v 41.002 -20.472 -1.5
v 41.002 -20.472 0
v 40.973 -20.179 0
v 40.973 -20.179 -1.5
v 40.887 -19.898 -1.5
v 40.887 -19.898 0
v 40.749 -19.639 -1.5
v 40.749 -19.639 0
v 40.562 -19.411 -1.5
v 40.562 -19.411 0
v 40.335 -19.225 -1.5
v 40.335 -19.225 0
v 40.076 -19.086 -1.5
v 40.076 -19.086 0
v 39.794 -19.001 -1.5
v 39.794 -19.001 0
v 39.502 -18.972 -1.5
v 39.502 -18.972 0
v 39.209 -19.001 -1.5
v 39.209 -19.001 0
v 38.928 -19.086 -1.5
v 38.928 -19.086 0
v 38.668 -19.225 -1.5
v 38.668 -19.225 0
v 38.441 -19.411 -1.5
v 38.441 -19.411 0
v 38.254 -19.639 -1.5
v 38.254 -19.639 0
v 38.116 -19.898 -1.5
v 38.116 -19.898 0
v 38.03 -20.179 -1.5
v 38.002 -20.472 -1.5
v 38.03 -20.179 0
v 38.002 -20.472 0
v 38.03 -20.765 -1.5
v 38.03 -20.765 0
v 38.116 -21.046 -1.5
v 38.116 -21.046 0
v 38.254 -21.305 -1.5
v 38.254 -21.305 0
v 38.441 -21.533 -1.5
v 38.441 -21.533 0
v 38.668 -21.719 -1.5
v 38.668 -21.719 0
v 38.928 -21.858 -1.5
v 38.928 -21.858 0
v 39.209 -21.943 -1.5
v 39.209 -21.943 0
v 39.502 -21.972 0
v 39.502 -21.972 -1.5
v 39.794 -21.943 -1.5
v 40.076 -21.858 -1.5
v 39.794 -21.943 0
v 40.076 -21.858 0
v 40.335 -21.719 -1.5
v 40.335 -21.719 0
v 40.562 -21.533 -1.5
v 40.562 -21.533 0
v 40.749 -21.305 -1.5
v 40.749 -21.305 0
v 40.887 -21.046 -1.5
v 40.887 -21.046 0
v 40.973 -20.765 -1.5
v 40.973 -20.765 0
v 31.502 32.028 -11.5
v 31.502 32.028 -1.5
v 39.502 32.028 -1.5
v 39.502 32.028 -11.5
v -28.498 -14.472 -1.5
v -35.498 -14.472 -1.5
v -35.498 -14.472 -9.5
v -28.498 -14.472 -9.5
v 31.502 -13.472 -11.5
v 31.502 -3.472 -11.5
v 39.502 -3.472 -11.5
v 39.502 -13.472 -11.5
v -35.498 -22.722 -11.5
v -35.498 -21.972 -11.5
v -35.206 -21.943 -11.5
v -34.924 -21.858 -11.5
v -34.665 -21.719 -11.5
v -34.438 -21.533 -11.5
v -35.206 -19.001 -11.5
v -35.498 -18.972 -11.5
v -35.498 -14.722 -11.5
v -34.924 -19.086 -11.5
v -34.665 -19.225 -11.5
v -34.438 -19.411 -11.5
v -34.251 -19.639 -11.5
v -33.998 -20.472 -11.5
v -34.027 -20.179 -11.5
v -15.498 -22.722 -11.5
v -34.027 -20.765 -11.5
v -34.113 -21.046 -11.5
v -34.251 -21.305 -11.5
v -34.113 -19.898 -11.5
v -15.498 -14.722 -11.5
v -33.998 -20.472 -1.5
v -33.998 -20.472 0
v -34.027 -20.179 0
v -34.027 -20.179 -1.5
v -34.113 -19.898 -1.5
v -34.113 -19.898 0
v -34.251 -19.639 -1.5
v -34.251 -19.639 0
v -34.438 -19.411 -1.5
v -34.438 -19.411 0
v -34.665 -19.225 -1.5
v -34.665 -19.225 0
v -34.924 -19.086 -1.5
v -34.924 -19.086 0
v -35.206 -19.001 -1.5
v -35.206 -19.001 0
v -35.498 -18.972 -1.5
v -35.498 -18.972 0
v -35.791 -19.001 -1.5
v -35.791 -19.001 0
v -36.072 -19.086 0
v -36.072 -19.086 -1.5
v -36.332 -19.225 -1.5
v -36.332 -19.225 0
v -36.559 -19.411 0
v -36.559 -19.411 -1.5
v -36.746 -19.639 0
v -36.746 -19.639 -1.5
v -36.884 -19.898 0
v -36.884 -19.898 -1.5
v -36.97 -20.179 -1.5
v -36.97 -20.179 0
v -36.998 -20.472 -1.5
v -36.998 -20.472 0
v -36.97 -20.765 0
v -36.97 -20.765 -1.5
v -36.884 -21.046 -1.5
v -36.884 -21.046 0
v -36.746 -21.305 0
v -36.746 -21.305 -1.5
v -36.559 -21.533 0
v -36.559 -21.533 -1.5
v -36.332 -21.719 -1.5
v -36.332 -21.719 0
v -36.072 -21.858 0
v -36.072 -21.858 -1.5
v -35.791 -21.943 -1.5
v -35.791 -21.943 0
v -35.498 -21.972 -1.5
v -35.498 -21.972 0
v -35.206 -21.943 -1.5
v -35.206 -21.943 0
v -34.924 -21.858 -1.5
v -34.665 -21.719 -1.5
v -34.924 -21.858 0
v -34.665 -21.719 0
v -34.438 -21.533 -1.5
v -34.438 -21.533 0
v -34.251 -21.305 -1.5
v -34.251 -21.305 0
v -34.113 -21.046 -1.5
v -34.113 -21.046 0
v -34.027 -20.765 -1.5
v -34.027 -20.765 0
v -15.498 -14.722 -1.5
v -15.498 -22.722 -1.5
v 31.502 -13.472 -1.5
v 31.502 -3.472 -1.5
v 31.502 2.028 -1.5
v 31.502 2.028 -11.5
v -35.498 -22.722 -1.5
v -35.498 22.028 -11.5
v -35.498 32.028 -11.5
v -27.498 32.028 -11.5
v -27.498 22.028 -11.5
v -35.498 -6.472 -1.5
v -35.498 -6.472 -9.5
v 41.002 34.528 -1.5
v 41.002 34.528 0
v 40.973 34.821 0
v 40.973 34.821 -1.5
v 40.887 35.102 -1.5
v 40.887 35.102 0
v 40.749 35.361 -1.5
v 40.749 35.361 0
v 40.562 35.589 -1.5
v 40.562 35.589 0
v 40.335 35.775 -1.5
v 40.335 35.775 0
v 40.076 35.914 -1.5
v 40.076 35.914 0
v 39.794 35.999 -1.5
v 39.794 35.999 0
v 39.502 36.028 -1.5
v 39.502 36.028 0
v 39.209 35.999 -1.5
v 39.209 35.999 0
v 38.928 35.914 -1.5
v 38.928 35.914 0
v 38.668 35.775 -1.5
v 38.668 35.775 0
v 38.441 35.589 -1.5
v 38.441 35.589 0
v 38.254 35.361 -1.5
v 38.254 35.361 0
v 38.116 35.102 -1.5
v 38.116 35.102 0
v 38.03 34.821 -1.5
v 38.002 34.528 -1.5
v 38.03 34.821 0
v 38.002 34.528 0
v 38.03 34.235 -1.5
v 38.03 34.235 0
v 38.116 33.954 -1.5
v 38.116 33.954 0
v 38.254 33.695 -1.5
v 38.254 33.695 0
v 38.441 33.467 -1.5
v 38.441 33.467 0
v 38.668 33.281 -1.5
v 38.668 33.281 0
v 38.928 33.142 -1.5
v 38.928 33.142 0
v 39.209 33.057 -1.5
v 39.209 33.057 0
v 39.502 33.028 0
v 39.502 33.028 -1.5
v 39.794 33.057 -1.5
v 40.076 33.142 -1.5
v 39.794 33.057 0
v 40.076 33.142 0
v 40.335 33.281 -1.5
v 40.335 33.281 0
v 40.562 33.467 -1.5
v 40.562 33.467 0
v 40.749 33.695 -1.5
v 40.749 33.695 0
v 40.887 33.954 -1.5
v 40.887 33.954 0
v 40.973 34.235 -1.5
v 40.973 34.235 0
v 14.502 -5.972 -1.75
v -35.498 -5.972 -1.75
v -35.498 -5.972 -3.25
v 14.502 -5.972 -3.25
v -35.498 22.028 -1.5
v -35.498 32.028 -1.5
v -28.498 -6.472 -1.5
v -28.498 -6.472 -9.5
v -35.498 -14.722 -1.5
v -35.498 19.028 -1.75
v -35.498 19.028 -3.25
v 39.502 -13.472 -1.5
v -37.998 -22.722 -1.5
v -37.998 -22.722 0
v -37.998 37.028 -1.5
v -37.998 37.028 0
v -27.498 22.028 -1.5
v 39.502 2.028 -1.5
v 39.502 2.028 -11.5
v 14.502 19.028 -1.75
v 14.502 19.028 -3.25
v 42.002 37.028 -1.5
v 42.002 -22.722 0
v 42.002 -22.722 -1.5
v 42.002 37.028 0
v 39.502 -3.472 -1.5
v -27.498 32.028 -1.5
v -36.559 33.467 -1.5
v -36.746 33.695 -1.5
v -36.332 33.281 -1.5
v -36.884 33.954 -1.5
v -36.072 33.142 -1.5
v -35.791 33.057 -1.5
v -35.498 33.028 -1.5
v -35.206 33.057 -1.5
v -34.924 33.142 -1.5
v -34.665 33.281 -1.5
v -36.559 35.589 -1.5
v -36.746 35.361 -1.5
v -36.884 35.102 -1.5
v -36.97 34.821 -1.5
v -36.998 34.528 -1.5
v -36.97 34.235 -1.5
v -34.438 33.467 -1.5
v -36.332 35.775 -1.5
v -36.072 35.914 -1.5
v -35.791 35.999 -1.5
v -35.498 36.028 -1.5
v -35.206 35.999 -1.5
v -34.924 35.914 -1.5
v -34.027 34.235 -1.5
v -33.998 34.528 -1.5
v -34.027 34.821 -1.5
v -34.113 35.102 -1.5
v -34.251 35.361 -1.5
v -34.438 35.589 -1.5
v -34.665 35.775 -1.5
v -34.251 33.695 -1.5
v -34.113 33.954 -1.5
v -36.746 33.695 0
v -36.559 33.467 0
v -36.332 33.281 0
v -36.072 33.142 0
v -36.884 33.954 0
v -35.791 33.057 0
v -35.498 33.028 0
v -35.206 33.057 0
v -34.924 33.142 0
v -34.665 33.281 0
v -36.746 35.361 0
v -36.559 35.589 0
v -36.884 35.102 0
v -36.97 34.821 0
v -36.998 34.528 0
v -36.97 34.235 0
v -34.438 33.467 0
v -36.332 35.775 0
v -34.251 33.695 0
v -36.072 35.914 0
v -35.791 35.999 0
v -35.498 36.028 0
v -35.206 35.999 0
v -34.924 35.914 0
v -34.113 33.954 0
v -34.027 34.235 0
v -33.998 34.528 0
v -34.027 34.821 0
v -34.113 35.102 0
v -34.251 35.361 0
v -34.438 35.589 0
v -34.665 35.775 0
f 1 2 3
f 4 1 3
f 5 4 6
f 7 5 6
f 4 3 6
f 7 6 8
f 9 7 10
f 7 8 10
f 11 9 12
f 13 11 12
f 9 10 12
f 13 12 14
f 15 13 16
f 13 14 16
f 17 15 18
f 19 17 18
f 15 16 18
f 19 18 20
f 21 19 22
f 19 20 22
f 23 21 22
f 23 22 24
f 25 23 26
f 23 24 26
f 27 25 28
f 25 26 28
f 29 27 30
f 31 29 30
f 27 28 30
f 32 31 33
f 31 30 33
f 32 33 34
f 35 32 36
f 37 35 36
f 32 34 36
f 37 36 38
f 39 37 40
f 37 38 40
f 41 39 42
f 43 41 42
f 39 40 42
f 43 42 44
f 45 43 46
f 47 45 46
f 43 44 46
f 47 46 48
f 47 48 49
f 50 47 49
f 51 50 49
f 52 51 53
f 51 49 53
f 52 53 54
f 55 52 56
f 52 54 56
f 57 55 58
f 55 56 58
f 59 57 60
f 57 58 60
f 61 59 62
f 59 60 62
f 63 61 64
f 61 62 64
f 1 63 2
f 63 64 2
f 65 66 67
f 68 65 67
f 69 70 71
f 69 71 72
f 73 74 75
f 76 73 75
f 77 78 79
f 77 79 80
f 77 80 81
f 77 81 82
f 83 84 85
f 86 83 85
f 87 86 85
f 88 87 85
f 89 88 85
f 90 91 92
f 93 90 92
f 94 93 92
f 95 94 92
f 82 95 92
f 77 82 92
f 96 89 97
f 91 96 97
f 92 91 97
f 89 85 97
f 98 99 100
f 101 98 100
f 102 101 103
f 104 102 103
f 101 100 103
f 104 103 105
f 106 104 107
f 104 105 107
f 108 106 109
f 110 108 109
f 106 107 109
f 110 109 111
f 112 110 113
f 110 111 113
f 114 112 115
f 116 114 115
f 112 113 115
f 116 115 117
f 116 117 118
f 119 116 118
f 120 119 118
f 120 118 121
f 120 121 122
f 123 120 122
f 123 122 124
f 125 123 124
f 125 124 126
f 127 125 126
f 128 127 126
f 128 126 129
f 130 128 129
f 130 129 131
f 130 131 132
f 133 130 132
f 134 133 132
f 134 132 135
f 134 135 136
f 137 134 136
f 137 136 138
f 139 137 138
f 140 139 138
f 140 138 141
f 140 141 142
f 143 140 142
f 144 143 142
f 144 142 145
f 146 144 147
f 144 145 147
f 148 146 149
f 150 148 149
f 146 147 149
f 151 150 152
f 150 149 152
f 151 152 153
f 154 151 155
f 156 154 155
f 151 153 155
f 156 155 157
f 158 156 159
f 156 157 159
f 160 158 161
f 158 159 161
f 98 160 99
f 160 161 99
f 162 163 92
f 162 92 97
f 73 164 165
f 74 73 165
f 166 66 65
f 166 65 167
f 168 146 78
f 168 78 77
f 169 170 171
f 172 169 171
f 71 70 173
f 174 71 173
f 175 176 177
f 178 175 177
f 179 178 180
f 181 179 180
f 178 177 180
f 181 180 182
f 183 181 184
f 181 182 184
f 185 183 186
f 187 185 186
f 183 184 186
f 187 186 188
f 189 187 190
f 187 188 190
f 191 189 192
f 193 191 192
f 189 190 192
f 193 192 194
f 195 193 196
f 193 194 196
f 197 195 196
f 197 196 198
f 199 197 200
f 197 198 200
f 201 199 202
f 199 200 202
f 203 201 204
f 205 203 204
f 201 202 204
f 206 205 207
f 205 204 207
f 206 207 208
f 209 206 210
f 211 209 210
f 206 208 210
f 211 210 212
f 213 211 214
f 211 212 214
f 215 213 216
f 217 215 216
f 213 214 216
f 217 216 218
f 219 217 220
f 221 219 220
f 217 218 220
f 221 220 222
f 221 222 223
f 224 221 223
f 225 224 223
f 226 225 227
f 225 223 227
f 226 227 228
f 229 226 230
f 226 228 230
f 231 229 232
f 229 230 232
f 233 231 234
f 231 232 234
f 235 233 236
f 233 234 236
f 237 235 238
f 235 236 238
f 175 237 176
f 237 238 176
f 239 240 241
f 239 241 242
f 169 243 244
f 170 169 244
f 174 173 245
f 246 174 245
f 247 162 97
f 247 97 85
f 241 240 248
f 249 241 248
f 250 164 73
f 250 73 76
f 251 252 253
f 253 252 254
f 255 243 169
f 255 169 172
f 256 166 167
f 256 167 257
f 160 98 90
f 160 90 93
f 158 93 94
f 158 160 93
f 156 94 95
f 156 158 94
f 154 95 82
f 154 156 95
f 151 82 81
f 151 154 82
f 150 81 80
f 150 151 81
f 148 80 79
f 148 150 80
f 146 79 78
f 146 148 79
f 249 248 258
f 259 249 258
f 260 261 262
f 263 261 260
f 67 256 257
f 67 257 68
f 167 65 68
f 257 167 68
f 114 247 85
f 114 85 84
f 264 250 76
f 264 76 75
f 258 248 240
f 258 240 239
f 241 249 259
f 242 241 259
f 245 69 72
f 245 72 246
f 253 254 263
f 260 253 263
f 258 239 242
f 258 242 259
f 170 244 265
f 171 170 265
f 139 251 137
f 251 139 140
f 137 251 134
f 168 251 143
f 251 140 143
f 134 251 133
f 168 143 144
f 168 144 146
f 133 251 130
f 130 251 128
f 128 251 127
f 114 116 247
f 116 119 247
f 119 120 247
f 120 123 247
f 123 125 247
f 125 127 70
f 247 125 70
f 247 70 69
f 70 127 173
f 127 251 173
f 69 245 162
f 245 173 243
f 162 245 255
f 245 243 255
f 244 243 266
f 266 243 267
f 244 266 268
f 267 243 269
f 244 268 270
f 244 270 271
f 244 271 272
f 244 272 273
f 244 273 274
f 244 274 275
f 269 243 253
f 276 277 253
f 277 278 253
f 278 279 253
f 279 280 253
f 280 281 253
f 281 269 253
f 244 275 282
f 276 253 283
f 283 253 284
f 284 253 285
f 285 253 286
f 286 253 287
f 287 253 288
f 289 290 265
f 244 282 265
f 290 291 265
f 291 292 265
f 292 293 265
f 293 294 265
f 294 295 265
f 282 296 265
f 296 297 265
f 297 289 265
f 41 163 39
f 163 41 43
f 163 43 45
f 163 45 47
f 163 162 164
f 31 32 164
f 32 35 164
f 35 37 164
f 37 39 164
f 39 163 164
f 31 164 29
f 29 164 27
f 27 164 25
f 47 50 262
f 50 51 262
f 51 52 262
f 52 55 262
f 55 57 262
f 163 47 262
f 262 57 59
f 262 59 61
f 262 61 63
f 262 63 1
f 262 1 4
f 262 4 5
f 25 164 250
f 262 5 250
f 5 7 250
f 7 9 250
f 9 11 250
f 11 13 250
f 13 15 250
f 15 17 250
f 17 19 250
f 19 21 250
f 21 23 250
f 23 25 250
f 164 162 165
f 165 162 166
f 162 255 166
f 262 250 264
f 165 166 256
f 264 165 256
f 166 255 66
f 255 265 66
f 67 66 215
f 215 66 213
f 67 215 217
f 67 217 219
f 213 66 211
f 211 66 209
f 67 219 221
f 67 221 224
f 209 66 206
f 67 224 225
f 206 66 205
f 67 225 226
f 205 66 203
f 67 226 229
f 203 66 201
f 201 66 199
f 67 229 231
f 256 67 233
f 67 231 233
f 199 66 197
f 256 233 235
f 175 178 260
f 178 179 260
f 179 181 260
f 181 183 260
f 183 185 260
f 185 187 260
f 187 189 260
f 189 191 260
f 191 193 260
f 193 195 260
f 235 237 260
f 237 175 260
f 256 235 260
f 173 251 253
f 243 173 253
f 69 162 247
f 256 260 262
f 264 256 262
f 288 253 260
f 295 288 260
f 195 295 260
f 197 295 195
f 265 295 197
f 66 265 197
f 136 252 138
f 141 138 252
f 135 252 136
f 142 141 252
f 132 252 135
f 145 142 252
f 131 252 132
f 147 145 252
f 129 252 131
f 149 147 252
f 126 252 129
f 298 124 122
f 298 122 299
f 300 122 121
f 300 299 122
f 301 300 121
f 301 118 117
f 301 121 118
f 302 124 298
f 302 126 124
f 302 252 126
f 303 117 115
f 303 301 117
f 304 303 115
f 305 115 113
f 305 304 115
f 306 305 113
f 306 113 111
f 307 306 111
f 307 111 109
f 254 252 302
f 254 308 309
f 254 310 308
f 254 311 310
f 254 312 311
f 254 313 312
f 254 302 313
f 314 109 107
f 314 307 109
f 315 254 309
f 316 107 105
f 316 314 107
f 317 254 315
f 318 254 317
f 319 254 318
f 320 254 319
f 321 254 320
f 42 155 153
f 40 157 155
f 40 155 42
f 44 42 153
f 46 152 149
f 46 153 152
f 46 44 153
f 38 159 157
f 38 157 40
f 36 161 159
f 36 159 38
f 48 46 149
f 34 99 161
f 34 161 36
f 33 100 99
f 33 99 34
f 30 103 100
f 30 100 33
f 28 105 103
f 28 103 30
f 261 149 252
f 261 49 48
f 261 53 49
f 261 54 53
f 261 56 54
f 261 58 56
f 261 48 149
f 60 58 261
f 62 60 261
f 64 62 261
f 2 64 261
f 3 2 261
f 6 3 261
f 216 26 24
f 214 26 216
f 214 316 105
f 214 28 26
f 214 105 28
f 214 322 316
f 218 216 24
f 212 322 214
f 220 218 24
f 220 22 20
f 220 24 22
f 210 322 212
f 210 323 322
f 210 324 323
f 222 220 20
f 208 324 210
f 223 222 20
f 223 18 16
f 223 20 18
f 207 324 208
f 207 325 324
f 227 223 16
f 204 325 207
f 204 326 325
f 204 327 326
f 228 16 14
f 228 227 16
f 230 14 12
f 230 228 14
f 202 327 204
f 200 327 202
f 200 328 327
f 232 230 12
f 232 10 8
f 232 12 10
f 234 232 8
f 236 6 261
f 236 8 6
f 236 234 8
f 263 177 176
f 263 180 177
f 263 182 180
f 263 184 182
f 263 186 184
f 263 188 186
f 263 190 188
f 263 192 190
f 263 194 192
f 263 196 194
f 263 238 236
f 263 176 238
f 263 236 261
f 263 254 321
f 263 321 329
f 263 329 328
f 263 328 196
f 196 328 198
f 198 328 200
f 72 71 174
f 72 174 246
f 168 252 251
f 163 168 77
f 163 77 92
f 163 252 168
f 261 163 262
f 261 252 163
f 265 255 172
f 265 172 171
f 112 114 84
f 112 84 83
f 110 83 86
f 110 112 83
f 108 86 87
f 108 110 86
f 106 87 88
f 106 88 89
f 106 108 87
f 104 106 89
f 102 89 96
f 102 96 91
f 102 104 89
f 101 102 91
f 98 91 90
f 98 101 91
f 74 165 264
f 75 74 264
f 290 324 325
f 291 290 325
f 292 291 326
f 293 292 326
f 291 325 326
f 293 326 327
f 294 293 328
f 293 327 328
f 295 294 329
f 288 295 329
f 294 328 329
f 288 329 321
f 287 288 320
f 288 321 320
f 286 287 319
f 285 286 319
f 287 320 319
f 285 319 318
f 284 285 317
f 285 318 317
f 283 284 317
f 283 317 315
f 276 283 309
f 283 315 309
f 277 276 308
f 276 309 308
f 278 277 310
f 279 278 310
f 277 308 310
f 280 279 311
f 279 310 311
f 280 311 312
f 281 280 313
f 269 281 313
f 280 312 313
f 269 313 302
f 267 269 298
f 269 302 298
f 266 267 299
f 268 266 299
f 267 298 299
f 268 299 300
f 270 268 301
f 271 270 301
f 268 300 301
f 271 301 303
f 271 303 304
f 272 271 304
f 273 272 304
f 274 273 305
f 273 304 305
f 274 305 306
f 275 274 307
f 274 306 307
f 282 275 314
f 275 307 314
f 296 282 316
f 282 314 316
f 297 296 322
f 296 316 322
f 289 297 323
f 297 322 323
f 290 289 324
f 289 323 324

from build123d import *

# Parameters (mm, degrees)
SKETCH1_W           = 80
SKETCH1_H           = 59.75
SKETCH1_R           = 1.5
BOSS_EXTRUDE1_DEPTH = 1.5
BOSS_EXTRUDE2_START = -1.75
SKETCH1_8_W         = 50
SKETCH1_8_H         = 25
BOSS_EXTRUDE2_DEPTH = 1.5
BOSS_EXTRUDE3_START = -1.5
SKETCH1_9_W         = 8
SKETCH1_9_H         = 10
SKETCH1_9_H_2       = 13
SKETCH1_9_H_3       = 17
BOSS_EXTRUDE3_DEPTH = 10
BOSS_EXTRUDE4_START = -1.5
SKETCH1_10_W        = 7
SKETCH1_10_H        = 8
BOSS_EXTRUDE4_DEPTH = 8


with BuildPart() as part:
    # Sketch1 → Boss-Extrude1 (new body)
    with BuildSketch(Plane.XY):
        with Locations((2.001671, 7.153)):
            Rectangle(SKETCH1_W, SKETCH1_H)
        with Locations((-35.498329, -20.472)):
            Circle(SKETCH1_R, mode=Mode.SUBTRACT)
        with Locations((39.501671, -20.472)):
            Circle(SKETCH1_R, mode=Mode.SUBTRACT)
        with Locations((-35.498329, 34.528)):
            Circle(SKETCH1_R, mode=Mode.SUBTRACT)
        with Locations((39.501671, 34.528)):
            Circle(SKETCH1_R, mode=Mode.SUBTRACT)
    extrude(amount=-BOSS_EXTRUDE1_DEPTH)

    # Sketch1<9> → Boss-Extrude3 (add)
    with BuildSketch(Plane.XY.offset(BOSS_EXTRUDE3_START)):
        with Locations((-31.498329, 27.028)):
            Rectangle(SKETCH1_9_W, SKETCH1_9_H)
        with Locations((35.501671, 25.528)):
            Rectangle(SKETCH1_9_W, SKETCH1_9_H_2)
        with Locations((35.501671, 10.528)):
            Rectangle(SKETCH1_9_W, SKETCH1_9_H_3)
        with Locations((35.501671, -8.472)):
            Rectangle(SKETCH1_9_W, SKETCH1_9_H)
        with BuildLine():
            Line((-15.498329, -14.722), (-35.498329, -14.722))
            Line((-35.498329, -14.722), (-35.498329, -18.972))
            ThreePointArc((-35.498329, -18.972), (-34.437669, -19.41134), (-33.998329, -20.472))
            Line((-33.998329, -20.472), (-15.498329, -20.472))
            Line((-15.498329, -20.472), (-15.498329, -14.722))
        make_face()
        with BuildLine():
            Line((-35.498329, -21.972), (-35.498329, -22.722))
            Line((-35.498329, -22.722), (-15.498329, -22.722))
            Line((-15.498329, -22.722), (-15.498329, -20.472))
            Line((-15.498329, -20.472), (-33.998329, -20.472))
            ThreePointArc((-33.998329, -20.472), (-34.437669, -21.53266), (-35.498329, -21.972))
        make_face()
    extrude(amount=-BOSS_EXTRUDE3_DEPTH)

    # Sketch1<10> → Boss-Extrude4 (add)
    with BuildSketch(Plane.XY.offset(BOSS_EXTRUDE4_START)):
        with Locations((-31.998329, -10.472)):
            Rectangle(SKETCH1_10_W, SKETCH1_10_H)
    extrude(amount=-BOSS_EXTRUDE4_DEPTH)


with BuildPart() as body_2:
    # Sketch1<8> → Boss-Extrude2 (new body)
    with BuildSketch(Plane.XY.offset(BOSS_EXTRUDE2_START)):
        with Locations((-10.498329, 6.528)):
            Rectangle(SKETCH1_8_W, SKETCH1_8_H)
    extrude(amount=-BOSS_EXTRUDE2_DEPTH)


solid = Compound([part.part, body_2.part])
